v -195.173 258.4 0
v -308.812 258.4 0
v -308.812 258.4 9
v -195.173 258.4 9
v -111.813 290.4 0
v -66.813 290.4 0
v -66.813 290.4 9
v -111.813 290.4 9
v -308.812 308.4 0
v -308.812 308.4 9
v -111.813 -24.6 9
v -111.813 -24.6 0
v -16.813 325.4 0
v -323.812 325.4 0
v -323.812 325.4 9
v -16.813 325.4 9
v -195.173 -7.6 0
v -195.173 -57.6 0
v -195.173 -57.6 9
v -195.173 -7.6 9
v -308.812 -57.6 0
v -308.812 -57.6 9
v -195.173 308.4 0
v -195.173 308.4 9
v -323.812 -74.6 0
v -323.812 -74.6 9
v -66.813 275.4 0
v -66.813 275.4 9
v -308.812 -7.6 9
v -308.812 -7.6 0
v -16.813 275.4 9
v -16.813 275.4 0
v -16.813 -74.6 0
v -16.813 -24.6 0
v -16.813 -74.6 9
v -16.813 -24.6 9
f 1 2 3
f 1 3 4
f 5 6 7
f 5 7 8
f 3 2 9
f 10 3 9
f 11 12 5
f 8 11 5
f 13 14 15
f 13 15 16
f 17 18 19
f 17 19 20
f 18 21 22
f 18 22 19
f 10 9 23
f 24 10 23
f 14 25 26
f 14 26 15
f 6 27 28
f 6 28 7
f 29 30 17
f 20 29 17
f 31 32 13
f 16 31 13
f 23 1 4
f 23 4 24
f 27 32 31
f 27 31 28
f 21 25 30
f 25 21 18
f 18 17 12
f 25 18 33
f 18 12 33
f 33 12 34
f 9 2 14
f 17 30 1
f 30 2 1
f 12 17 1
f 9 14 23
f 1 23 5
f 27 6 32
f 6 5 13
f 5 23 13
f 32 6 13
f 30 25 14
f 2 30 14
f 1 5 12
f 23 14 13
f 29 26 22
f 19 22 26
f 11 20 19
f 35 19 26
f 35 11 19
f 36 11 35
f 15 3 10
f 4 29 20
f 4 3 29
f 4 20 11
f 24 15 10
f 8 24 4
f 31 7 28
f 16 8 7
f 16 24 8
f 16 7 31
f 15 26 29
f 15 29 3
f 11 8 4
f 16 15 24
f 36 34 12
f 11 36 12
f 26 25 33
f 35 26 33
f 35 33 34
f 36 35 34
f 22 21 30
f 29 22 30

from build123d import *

# Parameters (mm, degrees)
SKETCH1_W           = 306.999208532
SKETCH1_H           = 400
SKETCH1_W_2         = 113.639208532
SKETCH1_H_2         = 50
BOSS_EXTRUDE1_DEPTH = 9
SKETCH2_W           = 95
SKETCH2_H           = 300
CUT_EXTRUDE1_DEPTH  = 460.151907085
SKETCH3_W           = 45
SKETCH3_H           = 15
CUT_EXTRUDE2_DEPTH  = 10


with BuildPart() as part:
    # Sketch1 → Boss-Extrude1 (new body)
    with BuildSketch(Plane.XY):
        with Locations((-170.312553906, 125.4)):
            Rectangle(SKETCH1_W, SKETCH1_H)
        with Locations((-251.992553906, 283.4)):
            Rectangle(SKETCH1_W_2, SKETCH1_H_2, mode=Mode.SUBTRACT)
        with Locations((-251.992553906, -32.6)):
            Rectangle(SKETCH1_W_2, SKETCH1_H_2, mode=Mode.SUBTRACT)
    extrude(amount=BOSS_EXTRUDE1_DEPTH)

    # Sketch2 → Cut-Extrude1 (cut, through all)
    with BuildSketch(Plane(origin=(0, 0, 0), x_dir=(-1, 0, 0), z_dir=(0, 0, -1))):
        with Locations((64.31294964, 125.4)):
            Rectangle(SKETCH2_W, SKETCH2_H)
    extrude(amount=-CUT_EXTRUDE1_DEPTH, mode=Mode.SUBTRACT)

    # Sketch3 → Cut-Extrude2 (cut)
    with BuildSketch(Plane(origin=(0, 0, 0), x_dir=(-1, 0, 0), z_dir=(0, 0, -1))):
        with Locations((89.31294964, 282.9)):
            Rectangle(SKETCH3_W, SKETCH3_H)
    extrude(amount=-CUT_EXTRUDE2_DEPTH, mode=Mode.SUBTRACT)


solid = part.part
